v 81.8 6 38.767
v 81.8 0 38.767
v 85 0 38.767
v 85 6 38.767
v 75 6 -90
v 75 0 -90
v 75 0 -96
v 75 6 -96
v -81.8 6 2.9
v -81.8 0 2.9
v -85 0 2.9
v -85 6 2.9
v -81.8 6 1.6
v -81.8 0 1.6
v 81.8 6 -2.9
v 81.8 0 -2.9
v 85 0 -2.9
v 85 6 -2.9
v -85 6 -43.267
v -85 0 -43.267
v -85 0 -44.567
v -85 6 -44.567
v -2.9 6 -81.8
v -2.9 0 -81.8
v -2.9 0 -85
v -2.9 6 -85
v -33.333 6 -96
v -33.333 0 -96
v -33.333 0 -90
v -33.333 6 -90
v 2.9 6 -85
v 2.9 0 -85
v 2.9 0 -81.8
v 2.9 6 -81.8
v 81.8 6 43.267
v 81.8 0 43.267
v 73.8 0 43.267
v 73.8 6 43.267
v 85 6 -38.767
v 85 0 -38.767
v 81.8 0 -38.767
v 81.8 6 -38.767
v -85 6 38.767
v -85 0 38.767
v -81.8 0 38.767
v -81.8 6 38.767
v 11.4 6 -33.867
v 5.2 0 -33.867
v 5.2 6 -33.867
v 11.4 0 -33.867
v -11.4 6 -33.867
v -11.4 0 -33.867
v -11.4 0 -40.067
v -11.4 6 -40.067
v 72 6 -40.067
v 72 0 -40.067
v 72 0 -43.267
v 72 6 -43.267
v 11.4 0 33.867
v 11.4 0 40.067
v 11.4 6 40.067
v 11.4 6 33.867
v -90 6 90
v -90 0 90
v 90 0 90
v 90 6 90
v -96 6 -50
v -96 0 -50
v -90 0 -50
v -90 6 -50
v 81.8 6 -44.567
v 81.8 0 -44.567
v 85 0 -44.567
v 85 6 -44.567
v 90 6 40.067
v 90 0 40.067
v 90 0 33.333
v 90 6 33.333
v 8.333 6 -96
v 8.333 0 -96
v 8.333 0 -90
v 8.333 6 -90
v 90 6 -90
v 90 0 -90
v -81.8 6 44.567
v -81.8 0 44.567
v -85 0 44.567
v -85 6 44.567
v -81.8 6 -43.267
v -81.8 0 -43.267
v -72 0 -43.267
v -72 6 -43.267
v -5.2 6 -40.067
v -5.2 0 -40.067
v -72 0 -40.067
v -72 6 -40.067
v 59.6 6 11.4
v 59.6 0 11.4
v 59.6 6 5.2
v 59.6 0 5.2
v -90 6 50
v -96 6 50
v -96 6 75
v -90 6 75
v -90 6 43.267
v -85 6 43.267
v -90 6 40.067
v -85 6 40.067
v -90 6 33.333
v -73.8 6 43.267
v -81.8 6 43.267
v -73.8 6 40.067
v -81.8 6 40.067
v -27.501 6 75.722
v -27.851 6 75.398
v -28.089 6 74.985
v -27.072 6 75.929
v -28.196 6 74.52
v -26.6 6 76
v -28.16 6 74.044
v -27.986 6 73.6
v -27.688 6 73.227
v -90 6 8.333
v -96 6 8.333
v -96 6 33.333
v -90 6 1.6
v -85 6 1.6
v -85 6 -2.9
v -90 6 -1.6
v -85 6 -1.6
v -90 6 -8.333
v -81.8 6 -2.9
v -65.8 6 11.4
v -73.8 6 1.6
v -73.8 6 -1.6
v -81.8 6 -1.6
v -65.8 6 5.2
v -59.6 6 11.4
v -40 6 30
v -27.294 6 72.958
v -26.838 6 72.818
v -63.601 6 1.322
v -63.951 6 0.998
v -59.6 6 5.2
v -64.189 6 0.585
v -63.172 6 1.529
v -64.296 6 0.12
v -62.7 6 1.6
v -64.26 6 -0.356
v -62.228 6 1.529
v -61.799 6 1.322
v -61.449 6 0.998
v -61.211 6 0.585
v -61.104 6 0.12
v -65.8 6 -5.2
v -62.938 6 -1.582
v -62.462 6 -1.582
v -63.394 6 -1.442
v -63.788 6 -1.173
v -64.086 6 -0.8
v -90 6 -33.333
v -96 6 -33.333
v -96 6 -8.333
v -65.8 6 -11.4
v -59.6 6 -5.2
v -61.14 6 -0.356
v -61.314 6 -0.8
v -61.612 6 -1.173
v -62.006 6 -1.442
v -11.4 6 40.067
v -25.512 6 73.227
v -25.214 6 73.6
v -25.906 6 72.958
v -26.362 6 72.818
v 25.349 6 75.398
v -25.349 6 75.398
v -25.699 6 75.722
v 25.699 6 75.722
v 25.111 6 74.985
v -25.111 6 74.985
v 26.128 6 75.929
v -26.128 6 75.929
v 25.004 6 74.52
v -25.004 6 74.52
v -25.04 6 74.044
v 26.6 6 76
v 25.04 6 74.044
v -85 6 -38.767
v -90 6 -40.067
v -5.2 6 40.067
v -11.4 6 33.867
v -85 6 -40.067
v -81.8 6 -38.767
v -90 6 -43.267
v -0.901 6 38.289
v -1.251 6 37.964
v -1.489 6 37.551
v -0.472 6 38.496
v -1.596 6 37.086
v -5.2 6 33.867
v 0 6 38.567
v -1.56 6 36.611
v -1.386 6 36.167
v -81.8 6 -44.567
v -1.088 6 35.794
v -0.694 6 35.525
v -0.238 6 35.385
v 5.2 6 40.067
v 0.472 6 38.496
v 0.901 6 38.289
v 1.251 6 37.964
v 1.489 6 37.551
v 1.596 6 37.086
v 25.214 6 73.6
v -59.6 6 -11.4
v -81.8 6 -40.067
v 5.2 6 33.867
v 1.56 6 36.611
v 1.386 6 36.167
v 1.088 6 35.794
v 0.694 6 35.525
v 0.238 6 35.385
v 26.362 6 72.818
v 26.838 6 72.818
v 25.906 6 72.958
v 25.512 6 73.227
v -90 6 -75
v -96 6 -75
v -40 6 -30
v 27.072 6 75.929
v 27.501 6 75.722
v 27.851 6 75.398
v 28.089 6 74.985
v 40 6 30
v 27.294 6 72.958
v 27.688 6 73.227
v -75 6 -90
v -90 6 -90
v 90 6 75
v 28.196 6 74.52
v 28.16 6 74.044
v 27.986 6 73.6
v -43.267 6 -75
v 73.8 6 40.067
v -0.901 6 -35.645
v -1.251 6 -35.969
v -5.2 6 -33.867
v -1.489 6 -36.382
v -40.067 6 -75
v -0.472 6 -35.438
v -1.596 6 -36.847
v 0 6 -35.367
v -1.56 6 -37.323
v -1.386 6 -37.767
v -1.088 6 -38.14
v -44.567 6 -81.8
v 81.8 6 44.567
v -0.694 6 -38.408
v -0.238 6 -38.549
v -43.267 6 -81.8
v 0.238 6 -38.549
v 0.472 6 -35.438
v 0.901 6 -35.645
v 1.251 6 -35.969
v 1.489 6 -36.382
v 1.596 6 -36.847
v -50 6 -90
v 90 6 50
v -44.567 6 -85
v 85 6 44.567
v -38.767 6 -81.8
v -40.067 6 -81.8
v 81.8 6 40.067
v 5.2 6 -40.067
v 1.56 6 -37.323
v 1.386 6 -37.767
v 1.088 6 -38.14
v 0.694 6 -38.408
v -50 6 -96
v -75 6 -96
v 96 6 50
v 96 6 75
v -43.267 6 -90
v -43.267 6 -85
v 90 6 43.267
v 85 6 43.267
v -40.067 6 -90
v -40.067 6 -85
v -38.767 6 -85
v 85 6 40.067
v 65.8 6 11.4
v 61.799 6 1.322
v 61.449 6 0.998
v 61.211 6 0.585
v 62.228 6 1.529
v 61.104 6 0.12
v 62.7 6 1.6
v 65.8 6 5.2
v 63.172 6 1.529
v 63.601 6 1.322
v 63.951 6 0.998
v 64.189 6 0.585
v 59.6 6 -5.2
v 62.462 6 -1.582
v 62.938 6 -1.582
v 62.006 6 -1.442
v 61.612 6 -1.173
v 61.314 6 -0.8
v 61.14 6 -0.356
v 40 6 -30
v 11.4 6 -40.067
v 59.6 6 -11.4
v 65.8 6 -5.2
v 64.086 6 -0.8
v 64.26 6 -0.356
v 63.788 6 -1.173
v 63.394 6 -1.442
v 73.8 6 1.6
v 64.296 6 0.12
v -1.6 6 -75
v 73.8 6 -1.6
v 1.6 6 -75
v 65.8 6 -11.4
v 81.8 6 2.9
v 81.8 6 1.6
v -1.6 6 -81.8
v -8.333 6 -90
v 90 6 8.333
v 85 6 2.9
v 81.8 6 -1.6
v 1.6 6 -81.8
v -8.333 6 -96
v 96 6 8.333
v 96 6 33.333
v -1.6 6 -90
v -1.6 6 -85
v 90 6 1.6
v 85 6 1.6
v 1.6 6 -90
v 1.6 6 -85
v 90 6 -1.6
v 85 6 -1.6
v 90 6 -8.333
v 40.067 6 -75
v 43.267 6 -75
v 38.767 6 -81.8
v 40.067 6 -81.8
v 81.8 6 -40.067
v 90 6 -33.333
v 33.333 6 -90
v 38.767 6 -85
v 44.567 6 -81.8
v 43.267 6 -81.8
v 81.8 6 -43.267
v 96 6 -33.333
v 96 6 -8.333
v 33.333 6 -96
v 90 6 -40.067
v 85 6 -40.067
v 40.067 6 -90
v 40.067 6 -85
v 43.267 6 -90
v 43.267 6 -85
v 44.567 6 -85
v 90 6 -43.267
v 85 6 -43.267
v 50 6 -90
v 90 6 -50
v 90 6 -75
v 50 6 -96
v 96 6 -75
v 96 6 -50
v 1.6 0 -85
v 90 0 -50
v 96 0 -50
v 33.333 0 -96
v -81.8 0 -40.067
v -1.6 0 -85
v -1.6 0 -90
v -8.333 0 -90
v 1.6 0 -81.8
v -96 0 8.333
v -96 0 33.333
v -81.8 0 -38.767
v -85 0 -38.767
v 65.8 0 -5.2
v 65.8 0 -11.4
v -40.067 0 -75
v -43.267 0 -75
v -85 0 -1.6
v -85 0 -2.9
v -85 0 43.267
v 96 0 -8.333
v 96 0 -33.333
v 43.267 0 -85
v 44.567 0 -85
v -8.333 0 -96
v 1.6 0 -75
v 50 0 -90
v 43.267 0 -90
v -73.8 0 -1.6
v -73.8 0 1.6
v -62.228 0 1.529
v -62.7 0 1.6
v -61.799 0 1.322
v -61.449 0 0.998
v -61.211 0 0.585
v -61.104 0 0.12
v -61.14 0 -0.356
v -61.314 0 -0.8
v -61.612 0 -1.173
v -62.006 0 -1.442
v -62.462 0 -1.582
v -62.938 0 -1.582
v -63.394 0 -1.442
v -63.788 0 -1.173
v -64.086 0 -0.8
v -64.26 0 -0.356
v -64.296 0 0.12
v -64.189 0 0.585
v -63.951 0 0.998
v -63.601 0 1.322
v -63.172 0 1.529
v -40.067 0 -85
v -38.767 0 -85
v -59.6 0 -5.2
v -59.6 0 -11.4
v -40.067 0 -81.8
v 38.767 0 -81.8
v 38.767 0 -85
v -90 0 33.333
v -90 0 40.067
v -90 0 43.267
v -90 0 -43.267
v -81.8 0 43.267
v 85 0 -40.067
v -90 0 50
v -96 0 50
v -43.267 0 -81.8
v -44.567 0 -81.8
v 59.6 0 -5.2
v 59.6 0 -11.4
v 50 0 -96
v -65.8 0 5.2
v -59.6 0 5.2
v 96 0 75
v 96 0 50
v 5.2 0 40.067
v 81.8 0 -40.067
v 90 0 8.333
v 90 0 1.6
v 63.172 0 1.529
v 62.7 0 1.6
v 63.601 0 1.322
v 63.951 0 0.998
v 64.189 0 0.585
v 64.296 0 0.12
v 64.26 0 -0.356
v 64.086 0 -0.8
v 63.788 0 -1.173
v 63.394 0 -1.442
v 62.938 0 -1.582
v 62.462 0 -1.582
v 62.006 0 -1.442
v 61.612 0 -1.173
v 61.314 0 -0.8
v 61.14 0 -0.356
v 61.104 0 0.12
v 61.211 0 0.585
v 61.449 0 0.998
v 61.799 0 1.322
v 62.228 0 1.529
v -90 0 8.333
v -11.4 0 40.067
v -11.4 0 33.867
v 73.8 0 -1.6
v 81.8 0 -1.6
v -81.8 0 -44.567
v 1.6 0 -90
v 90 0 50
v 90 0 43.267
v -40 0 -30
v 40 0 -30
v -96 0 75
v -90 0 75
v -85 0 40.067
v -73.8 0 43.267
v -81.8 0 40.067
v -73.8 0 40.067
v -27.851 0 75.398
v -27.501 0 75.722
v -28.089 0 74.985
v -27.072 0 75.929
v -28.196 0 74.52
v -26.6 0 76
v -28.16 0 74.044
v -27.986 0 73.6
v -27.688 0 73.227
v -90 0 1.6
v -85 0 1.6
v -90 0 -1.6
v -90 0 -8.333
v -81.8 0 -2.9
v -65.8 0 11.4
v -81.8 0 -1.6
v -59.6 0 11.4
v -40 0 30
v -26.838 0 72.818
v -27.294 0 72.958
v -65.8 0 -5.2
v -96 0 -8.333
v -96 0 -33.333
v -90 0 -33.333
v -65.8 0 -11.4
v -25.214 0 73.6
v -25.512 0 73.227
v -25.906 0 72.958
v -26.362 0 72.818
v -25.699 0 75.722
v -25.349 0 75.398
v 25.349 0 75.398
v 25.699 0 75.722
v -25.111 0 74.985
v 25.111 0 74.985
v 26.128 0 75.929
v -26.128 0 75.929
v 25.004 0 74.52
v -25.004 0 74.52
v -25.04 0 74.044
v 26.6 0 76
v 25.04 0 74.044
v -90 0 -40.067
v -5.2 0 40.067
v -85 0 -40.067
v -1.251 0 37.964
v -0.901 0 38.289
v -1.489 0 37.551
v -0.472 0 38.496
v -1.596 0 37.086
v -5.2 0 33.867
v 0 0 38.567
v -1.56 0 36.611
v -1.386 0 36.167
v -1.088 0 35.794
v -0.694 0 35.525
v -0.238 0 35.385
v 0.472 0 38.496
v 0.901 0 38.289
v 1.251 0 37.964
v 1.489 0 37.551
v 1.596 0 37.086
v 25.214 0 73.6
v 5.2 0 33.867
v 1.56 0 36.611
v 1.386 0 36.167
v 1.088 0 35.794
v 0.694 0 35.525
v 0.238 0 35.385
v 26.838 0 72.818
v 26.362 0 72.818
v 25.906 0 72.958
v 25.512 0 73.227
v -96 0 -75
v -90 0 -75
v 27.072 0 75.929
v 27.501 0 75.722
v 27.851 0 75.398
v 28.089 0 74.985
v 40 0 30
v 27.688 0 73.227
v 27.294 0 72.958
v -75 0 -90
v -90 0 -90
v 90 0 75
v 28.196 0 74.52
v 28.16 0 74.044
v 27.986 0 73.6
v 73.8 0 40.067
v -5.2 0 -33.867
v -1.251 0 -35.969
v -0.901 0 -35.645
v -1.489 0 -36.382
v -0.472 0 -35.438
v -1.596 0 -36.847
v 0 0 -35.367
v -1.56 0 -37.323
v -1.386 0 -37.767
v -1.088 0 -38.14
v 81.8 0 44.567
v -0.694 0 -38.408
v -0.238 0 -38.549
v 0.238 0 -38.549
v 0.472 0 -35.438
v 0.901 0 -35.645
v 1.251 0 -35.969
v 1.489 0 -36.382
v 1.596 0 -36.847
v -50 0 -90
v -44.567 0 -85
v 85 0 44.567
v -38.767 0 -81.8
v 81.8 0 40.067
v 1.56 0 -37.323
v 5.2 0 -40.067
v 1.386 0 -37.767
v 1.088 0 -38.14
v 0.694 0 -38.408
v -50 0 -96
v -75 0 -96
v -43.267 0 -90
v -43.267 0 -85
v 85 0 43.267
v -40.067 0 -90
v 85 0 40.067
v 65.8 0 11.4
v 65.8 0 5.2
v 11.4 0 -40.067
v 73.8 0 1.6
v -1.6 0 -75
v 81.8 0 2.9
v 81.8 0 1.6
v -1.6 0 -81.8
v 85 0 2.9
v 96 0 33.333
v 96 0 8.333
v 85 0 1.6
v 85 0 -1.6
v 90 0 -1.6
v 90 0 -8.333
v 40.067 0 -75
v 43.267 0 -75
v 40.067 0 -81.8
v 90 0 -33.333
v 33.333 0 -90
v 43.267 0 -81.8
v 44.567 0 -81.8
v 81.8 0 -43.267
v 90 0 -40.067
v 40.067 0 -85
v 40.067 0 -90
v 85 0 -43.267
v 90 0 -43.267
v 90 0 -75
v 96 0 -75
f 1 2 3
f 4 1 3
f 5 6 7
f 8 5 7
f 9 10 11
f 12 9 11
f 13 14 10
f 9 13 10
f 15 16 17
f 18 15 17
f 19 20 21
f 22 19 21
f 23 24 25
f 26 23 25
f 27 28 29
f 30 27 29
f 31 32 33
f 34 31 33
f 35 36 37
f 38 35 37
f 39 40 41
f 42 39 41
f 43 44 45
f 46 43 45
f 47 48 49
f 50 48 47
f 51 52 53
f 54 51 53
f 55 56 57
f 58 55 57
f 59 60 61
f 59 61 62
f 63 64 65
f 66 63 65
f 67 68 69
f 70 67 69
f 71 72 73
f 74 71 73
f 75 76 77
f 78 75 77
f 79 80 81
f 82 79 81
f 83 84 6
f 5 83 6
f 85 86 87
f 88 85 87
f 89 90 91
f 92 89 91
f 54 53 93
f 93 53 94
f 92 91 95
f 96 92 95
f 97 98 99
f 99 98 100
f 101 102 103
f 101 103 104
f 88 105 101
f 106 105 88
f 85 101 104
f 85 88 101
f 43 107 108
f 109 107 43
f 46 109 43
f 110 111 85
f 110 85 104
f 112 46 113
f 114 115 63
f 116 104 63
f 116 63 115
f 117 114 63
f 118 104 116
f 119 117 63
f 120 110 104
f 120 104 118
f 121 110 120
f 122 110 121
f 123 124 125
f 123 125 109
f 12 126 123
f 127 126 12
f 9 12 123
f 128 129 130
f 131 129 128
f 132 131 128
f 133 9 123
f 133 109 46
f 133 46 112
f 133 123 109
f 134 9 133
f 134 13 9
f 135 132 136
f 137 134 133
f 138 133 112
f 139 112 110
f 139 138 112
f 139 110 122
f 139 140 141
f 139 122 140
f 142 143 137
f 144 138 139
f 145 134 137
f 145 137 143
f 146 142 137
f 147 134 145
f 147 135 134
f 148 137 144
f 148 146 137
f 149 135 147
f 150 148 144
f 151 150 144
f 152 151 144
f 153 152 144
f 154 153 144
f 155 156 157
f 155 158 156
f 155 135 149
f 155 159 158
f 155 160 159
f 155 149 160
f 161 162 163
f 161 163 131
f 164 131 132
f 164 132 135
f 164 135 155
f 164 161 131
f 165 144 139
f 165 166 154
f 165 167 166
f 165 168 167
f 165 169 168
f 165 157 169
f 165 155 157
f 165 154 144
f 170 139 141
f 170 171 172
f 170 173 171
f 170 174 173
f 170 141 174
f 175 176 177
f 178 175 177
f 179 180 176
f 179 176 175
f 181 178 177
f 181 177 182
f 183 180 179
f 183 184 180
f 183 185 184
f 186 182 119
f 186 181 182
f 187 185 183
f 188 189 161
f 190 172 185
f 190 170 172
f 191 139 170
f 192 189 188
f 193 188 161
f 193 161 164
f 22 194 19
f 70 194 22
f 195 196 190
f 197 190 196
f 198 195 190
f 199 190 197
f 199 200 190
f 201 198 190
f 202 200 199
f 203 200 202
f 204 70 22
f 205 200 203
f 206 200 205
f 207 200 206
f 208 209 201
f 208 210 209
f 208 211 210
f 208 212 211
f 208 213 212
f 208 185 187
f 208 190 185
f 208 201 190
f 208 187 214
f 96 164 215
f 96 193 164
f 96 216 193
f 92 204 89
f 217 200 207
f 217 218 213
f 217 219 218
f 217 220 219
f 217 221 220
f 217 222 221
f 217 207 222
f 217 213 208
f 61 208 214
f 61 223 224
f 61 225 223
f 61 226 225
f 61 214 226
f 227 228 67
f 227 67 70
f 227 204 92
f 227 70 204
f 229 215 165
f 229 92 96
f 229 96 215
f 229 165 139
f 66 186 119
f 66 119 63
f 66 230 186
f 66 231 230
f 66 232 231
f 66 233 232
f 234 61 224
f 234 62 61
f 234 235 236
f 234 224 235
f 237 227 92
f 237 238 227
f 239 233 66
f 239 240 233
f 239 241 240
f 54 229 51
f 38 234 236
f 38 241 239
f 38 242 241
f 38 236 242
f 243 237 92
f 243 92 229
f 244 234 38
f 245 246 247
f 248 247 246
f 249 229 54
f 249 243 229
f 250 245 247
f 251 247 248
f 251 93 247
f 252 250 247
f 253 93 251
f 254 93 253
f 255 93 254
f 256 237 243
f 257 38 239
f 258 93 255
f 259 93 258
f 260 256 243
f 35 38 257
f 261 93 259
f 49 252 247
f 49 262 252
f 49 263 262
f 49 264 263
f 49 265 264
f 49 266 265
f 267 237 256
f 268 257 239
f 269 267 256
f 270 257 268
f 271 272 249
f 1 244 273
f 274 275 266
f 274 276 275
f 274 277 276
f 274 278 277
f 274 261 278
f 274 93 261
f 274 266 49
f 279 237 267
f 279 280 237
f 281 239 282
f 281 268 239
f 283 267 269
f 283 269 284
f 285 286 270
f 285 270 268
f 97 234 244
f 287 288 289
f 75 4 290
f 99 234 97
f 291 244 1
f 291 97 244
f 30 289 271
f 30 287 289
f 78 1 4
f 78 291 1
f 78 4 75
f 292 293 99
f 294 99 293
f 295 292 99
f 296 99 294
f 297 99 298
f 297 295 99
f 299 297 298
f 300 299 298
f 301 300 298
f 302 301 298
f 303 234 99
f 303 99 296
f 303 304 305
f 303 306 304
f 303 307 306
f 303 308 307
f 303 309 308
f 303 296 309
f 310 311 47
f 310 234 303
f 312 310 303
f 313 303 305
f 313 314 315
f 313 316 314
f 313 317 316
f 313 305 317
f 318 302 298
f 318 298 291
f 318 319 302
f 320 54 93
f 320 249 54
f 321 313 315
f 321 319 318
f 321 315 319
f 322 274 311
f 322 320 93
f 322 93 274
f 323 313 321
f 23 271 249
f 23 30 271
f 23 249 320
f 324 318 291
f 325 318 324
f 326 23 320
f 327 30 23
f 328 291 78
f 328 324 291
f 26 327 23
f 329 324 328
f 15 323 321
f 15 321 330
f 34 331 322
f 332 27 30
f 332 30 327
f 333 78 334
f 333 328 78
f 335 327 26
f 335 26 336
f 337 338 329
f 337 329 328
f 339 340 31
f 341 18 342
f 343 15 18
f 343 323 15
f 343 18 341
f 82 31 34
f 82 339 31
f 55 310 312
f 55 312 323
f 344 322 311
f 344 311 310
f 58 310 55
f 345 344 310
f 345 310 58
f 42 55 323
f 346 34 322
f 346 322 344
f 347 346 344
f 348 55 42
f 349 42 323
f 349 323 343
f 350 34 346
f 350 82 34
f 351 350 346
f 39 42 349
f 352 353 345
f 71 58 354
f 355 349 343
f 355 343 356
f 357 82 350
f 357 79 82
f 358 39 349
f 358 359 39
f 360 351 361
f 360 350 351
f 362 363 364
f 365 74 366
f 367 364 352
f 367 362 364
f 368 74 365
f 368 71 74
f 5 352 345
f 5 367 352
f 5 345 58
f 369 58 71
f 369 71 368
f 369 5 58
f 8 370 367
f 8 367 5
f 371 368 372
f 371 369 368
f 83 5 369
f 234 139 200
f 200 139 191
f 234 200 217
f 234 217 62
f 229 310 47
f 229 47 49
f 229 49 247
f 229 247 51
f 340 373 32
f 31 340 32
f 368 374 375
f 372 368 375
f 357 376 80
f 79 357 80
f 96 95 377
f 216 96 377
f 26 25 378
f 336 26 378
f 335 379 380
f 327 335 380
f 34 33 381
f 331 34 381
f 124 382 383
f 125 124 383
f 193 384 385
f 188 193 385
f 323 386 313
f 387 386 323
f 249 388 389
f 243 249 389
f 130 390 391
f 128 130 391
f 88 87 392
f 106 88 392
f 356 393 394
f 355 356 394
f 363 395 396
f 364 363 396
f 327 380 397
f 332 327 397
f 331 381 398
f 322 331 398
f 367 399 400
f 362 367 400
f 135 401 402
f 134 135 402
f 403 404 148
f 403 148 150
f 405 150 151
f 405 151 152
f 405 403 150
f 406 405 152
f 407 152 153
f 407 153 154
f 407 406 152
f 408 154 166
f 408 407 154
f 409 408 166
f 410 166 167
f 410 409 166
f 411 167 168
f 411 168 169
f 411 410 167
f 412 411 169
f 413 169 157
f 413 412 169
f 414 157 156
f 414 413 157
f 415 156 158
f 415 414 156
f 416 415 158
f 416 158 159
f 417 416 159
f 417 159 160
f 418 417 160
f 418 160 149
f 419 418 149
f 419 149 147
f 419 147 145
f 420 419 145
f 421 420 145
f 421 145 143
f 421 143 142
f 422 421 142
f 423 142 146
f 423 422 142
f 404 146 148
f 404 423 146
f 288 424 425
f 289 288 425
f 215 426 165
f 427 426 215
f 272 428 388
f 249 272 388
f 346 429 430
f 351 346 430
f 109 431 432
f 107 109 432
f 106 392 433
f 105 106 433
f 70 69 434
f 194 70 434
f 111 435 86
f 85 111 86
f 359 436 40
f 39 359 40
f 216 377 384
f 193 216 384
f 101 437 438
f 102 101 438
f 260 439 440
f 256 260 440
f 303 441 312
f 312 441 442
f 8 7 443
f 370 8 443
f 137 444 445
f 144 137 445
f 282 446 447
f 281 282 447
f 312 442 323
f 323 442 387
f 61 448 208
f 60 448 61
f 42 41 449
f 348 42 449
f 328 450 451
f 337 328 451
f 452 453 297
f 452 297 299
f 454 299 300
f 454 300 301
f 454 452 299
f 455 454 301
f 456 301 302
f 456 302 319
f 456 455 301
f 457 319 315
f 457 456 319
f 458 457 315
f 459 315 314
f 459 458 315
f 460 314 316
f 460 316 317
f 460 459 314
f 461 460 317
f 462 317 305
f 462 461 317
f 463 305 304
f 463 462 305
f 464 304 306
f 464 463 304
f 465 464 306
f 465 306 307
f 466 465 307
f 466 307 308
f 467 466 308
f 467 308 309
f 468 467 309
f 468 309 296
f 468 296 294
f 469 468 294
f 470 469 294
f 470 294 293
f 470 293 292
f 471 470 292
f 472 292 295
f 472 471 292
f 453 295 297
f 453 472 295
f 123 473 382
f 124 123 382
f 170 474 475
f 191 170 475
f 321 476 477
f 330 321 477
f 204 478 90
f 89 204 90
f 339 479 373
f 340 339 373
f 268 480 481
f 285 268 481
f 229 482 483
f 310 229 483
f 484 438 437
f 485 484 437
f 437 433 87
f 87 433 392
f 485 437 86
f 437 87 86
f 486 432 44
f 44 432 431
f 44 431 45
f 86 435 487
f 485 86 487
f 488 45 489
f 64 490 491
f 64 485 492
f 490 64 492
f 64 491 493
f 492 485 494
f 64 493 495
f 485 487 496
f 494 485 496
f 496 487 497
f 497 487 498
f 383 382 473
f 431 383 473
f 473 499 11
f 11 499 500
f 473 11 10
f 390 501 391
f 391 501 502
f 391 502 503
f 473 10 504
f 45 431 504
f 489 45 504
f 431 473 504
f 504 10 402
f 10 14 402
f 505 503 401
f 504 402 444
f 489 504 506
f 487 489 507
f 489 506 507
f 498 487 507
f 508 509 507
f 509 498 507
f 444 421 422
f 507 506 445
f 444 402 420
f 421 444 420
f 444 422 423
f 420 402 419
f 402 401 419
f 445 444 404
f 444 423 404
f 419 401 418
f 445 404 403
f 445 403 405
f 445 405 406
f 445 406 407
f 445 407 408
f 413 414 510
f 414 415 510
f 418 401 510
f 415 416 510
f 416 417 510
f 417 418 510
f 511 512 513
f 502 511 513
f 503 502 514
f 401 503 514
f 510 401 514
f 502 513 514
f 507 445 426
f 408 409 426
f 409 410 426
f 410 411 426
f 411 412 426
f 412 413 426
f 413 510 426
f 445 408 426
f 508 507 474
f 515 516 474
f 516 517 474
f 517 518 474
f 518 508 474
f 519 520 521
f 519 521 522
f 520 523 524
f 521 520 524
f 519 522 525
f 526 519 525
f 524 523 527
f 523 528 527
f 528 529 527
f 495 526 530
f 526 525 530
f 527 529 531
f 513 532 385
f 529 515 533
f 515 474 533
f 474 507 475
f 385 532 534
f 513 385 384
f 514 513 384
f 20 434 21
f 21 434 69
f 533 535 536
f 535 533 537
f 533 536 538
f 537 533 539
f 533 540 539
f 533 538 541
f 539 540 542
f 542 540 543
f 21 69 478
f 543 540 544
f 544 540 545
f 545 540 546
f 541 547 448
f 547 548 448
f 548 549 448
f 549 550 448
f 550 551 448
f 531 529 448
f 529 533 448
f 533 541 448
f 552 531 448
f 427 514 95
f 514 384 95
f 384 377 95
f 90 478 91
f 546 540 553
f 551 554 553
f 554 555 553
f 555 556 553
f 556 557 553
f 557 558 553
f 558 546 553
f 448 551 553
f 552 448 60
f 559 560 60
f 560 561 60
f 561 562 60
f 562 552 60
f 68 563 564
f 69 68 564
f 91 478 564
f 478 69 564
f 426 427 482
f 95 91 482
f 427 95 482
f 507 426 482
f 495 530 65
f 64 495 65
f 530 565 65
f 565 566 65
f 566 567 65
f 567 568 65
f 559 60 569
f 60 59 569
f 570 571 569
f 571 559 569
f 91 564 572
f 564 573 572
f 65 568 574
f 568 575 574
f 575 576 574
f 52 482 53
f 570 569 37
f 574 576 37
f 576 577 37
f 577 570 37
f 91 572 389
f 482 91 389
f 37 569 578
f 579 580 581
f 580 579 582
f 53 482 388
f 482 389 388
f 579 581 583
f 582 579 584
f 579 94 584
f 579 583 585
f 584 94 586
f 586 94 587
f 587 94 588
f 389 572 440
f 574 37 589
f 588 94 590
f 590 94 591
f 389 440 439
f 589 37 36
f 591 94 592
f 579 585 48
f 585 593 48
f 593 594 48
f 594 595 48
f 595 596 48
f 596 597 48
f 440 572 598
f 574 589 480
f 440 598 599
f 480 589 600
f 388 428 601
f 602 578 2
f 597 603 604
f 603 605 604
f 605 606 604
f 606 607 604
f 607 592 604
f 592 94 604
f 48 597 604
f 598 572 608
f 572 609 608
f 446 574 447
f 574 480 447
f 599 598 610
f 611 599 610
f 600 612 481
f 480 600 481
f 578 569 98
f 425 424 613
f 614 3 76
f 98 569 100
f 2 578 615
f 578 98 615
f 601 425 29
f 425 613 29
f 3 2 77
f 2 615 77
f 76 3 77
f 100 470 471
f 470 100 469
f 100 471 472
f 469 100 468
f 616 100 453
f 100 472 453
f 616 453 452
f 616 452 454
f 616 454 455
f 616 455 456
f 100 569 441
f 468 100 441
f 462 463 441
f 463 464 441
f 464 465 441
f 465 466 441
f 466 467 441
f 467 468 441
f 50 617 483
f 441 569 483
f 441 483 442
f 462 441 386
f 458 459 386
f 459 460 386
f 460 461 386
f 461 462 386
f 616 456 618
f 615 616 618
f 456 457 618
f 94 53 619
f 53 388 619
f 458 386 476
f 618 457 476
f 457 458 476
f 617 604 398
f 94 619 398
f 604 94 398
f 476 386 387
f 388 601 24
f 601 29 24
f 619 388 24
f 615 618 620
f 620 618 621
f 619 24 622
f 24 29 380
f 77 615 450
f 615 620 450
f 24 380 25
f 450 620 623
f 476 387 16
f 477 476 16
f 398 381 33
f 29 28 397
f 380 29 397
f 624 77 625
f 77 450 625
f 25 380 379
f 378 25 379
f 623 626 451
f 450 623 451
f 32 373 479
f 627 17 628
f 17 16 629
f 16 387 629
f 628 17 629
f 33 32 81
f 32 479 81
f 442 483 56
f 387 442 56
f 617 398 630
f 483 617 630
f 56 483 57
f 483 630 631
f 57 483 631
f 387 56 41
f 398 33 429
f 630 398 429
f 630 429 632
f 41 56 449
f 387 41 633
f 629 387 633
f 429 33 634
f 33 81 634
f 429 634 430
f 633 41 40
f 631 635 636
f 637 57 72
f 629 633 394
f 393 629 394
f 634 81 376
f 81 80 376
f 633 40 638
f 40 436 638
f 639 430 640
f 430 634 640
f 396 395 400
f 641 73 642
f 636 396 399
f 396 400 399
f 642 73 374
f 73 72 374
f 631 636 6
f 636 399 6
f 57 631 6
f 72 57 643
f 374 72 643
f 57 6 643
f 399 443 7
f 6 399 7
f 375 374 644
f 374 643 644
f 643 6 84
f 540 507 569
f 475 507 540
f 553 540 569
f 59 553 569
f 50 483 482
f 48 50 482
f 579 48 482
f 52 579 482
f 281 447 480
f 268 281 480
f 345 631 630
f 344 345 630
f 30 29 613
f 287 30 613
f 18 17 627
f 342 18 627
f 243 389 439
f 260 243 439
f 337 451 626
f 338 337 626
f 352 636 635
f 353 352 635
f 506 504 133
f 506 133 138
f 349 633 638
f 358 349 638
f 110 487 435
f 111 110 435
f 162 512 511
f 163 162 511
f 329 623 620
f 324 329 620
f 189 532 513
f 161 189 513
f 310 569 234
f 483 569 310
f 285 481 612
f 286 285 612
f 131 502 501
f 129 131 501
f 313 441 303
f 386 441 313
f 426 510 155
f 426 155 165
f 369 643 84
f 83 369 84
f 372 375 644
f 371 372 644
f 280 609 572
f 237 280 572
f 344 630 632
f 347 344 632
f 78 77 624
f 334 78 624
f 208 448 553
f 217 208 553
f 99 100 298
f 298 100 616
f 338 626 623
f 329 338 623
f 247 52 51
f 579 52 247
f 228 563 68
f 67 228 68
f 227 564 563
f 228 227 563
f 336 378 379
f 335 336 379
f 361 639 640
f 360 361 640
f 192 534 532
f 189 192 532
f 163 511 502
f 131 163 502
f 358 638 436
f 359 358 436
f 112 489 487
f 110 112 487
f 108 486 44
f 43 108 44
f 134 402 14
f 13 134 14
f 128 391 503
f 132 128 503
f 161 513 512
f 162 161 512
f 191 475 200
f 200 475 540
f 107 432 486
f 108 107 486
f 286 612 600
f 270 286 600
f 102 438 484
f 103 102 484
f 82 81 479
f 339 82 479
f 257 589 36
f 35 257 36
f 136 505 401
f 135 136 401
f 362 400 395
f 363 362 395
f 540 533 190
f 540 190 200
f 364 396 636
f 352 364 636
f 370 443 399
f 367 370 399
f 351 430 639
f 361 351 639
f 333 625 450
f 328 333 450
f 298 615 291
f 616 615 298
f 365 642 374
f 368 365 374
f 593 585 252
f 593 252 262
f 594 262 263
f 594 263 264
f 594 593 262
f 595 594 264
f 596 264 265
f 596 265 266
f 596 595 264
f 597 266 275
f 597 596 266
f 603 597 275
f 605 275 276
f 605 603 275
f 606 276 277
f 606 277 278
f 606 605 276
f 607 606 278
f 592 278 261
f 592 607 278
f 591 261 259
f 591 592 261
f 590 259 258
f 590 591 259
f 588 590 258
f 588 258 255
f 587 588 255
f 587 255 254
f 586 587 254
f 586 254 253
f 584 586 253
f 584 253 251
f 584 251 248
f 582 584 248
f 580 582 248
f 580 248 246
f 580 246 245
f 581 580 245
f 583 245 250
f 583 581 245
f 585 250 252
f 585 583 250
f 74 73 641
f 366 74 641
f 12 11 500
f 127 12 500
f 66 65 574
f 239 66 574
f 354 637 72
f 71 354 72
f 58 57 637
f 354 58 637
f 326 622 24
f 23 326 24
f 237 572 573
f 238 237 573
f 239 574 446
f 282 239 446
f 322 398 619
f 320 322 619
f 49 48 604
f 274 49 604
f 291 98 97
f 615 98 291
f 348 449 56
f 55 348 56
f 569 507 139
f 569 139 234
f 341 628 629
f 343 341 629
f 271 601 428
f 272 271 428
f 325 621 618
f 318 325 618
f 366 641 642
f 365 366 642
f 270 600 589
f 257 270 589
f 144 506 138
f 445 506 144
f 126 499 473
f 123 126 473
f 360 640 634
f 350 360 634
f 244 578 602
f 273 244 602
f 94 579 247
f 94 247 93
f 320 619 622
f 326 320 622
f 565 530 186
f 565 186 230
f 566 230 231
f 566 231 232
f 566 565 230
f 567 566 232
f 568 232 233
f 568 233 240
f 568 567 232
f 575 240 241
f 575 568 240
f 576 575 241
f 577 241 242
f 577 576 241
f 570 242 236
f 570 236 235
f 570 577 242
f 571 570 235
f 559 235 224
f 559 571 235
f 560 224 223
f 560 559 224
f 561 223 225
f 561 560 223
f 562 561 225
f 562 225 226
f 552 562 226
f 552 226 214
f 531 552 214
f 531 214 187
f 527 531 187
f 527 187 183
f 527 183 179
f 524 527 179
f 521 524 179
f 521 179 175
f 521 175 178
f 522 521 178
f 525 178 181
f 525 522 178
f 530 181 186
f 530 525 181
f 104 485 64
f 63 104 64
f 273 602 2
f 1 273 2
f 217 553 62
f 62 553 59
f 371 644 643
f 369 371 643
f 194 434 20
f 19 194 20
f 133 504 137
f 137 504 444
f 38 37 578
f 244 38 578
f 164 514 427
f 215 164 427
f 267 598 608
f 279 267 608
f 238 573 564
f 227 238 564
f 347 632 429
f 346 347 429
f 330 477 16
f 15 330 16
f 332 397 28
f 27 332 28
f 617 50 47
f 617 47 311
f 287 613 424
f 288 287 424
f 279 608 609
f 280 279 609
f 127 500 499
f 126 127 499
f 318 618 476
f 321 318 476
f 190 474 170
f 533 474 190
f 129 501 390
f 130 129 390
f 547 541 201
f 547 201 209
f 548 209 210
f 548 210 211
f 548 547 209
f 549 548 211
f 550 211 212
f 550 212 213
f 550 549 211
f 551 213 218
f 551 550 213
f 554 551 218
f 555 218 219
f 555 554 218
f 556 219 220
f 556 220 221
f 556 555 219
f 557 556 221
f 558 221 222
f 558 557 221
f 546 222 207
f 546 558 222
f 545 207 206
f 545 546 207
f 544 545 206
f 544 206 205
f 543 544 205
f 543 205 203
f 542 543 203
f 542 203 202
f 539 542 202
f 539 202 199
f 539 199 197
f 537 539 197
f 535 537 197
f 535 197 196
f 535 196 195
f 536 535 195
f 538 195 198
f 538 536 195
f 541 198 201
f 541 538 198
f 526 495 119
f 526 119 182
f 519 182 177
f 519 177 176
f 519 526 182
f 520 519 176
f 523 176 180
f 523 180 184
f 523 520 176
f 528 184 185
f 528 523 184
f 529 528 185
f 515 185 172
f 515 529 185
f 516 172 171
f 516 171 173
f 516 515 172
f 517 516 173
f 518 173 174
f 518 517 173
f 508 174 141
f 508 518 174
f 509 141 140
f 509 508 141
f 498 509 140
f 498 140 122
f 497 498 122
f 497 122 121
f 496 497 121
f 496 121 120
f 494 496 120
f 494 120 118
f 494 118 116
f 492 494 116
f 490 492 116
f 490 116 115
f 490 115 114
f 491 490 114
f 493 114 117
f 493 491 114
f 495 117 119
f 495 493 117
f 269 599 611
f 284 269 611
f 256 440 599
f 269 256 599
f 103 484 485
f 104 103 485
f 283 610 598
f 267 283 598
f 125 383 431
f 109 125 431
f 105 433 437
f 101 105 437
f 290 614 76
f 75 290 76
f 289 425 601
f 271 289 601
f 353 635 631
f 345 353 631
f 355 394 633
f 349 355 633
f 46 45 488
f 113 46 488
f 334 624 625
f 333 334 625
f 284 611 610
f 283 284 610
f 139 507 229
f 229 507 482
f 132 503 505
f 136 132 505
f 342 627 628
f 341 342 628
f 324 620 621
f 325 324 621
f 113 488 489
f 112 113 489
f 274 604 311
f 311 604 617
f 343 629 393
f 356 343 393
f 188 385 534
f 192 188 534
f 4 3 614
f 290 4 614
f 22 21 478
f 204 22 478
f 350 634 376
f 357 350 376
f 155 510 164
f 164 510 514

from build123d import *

# Parameters (mm, degrees)
SKETCH1_R           = 1.6
SKETCH1_W           = 6.2
SKETCH1_H           = 6.2
SKETCH1_W_2         = 80
SKETCH1_H_2         = 60
BOSS_EXTRUDE1_DEPTH = 6


with BuildPart() as part:
    # Sketch1 → Boss-Extrude1 (new body)
    with BuildSketch(Plane(origin=(0, 0, 0), x_dir=(1, 0, 0), z_dir=(0, 1, 0))):
        Polygon((85, 43.266666667), (90, 43.266666667), (90, 50), (96, 50), (96, 75), (90, 75), (90, 90), (75, 90), (75, 96), (50, 96), (50, 90), (43.266666667, 90), (43.266666667, 85), (44.566666667, 85), (44.566666667, 81.8), (43.266666667, 81.8), (43.266666667, 75), (40.066666667, 75), (40.066666667, 81.8), (38.766666667, 81.8), (38.766666667, 85), (40.066666667, 85), (40.066666667, 90), (33.333333333, 90), (33.333333333, 96), (8.333333333, 96), (8.333333333, 90), (1.6, 90), (1.6, 85), (2.9, 85), (2.9, 81.8), (1.6, 81.8), (1.6, 75), (-1.6, 75), (-1.6, 81.8), (-2.9, 81.8), (-2.9, 85), (-1.6, 85), (-1.6, 90), (-8.333333333, 90), (-8.333333333, 96), (-33.333333333, 96), (-33.333333333, 90), (-40.066666667, 90), (-40.066666667, 85), (-38.766666667, 85), (-38.766666667, 81.8), (-40.066666667, 81.8), (-40.066666667, 75), (-43.266666667, 75), (-43.266666667, 81.8), (-44.566666667, 81.8), (-44.566666667, 85), (-43.266666667, 85), (-43.266666667, 90), (-50, 90), (-50, 96), (-75, 96), (-75, 90), (-90, 90), (-90, 75), (-96, 75), (-96, 50), (-90, 50), (-90, 43.266666667), (-85, 43.266666667), (-85, 44.566666667), (-81.8, 44.566666667), (-81.8, 43.266666667), (-72, 43.266666667), (-72, 40.066666667), (-81.8, 40.066666667), (-81.8, 38.766666667), (-85, 38.766666667), (-85, 40.066666667), (-90, 40.066666667), (-90, 33.333333333), (-96, 33.333333333), (-96, 8.333333333), (-90, 8.333333333), (-90, 1.6), (-85, 1.6), (-85, 2.9), (-81.8, 2.9), (-81.8, 1.6), (-73.8, 1.6), (-73.8, -1.6), (-81.8, -1.6), (-81.8, -2.9), (-85, -2.9), (-85, -1.6), (-90, -1.6), (-90, -8.333333333), (-96, -8.333333333), (-96, -33.333333333), (-90, -33.333333333), (-90, -40.066666667), (-85, -40.066666667), (-85, -38.766666667), (-81.8, -38.766666667), (-81.8, -40.066666667), (-73.8, -40.066666667), (-73.8, -43.266666667), (-81.8, -43.266666667), (-81.8, -44.566666667), (-85, -44.566666667), (-85, -43.266666667), (-90, -43.266666667), (-90, -50), (-96, -50), (-96, -75), (-90, -75), (-90, -90), (90, -90), (90, -75), (96, -75), (96, -50), (90, -50), (90, -43.266666667), (85, -43.266666667), (85, -44.566666667), (81.8, -44.566666667), (81.8, -43.266666667), (73.8, -43.266666667), (73.8, -40.066666667), (81.8, -40.066666667), (81.8, -38.766666667), (85, -38.766666667), (85, -40.066666667), (90, -40.066666667), (90, -33.333333333), (96, -33.333333333), (96, -8.333333333), (90, -8.333333333), (90, -1.6), (85, -1.6), (85, -2.9), (81.8, -2.9), (81.8, -1.6), (73.8, -1.6), (73.8, 1.6), (81.8, 1.6), (81.8, 2.9), (85, 2.9), (85, 1.6), (90, 1.6), (90, 8.333333333), (96, 8.333333333), (96, 33.333333333), (90, 33.333333333), (90, 40.066666667), (85, 40.066666667), (85, 38.766666667), (81.8, 38.766666667), (81.8, 40.066666667), (72, 40.066666667), (72, 43.266666667), (81.8, 43.266666667), (81.8, 44.566666667), (85, 44.566666667), align=None)
        with Locations(Location((-26.6, -74.4, 0), (0, 0, 270))):
            Circle(SKETCH1_R, mode=Mode.SUBTRACT)
        with Locations((-62.7, -8.3)):
            Rectangle(SKETCH1_W, SKETCH1_H, mode=Mode.SUBTRACT)
        with Locations(Location((-62.7, 0, 0), (0, 0, 270))):
            Circle(SKETCH1_R, mode=Mode.SUBTRACT)
        with Locations((-8.3, -36.966666667)):
            Rectangle(SKETCH1_W, SKETCH1_H, mode=Mode.SUBTRACT)
        with Locations(Location((0, -36.966666667, 0), (0, 0, 270))):
            Circle(SKETCH1_R, mode=Mode.SUBTRACT)
        Rectangle(SKETCH1_W_2, SKETCH1_H_2, mode=Mode.SUBTRACT)
        with Locations(Location((26.6, -74.4, 0), (0, 0, 270))):
            Circle(SKETCH1_R, mode=Mode.SUBTRACT)
        with Locations((8.3, -36.966666667)):
            Rectangle(SKETCH1_W, SKETCH1_H, mode=Mode.SUBTRACT)
        with Locations((62.7, -8.3)):
            Rectangle(SKETCH1_W, SKETCH1_H, mode=Mode.SUBTRACT)
        with Locations(Location((62.7, 0, 0), (0, 0, 270))):
            Circle(SKETCH1_R, mode=Mode.SUBTRACT)
        with Locations((-62.7, 8.3)):
            Rectangle(SKETCH1_W, SKETCH1_H, mode=Mode.SUBTRACT)
        with Locations((-8.3, 36.966666667)):
            Rectangle(SKETCH1_W, SKETCH1_H, mode=Mode.SUBTRACT)
        with Locations(Location((0, 36.966666667, 0), (0, 0, 270))):
            Circle(SKETCH1_R, mode=Mode.SUBTRACT)
        with Locations((8.3, 36.966666667)):
            Rectangle(SKETCH1_W, SKETCH1_H, mode=Mode.SUBTRACT)
        with Locations((62.7, 8.3)):
            Rectangle(SKETCH1_W, SKETCH1_H, mode=Mode.SUBTRACT)
    extrude(amount=BOSS_EXTRUDE1_DEPTH)


solid = part.part
